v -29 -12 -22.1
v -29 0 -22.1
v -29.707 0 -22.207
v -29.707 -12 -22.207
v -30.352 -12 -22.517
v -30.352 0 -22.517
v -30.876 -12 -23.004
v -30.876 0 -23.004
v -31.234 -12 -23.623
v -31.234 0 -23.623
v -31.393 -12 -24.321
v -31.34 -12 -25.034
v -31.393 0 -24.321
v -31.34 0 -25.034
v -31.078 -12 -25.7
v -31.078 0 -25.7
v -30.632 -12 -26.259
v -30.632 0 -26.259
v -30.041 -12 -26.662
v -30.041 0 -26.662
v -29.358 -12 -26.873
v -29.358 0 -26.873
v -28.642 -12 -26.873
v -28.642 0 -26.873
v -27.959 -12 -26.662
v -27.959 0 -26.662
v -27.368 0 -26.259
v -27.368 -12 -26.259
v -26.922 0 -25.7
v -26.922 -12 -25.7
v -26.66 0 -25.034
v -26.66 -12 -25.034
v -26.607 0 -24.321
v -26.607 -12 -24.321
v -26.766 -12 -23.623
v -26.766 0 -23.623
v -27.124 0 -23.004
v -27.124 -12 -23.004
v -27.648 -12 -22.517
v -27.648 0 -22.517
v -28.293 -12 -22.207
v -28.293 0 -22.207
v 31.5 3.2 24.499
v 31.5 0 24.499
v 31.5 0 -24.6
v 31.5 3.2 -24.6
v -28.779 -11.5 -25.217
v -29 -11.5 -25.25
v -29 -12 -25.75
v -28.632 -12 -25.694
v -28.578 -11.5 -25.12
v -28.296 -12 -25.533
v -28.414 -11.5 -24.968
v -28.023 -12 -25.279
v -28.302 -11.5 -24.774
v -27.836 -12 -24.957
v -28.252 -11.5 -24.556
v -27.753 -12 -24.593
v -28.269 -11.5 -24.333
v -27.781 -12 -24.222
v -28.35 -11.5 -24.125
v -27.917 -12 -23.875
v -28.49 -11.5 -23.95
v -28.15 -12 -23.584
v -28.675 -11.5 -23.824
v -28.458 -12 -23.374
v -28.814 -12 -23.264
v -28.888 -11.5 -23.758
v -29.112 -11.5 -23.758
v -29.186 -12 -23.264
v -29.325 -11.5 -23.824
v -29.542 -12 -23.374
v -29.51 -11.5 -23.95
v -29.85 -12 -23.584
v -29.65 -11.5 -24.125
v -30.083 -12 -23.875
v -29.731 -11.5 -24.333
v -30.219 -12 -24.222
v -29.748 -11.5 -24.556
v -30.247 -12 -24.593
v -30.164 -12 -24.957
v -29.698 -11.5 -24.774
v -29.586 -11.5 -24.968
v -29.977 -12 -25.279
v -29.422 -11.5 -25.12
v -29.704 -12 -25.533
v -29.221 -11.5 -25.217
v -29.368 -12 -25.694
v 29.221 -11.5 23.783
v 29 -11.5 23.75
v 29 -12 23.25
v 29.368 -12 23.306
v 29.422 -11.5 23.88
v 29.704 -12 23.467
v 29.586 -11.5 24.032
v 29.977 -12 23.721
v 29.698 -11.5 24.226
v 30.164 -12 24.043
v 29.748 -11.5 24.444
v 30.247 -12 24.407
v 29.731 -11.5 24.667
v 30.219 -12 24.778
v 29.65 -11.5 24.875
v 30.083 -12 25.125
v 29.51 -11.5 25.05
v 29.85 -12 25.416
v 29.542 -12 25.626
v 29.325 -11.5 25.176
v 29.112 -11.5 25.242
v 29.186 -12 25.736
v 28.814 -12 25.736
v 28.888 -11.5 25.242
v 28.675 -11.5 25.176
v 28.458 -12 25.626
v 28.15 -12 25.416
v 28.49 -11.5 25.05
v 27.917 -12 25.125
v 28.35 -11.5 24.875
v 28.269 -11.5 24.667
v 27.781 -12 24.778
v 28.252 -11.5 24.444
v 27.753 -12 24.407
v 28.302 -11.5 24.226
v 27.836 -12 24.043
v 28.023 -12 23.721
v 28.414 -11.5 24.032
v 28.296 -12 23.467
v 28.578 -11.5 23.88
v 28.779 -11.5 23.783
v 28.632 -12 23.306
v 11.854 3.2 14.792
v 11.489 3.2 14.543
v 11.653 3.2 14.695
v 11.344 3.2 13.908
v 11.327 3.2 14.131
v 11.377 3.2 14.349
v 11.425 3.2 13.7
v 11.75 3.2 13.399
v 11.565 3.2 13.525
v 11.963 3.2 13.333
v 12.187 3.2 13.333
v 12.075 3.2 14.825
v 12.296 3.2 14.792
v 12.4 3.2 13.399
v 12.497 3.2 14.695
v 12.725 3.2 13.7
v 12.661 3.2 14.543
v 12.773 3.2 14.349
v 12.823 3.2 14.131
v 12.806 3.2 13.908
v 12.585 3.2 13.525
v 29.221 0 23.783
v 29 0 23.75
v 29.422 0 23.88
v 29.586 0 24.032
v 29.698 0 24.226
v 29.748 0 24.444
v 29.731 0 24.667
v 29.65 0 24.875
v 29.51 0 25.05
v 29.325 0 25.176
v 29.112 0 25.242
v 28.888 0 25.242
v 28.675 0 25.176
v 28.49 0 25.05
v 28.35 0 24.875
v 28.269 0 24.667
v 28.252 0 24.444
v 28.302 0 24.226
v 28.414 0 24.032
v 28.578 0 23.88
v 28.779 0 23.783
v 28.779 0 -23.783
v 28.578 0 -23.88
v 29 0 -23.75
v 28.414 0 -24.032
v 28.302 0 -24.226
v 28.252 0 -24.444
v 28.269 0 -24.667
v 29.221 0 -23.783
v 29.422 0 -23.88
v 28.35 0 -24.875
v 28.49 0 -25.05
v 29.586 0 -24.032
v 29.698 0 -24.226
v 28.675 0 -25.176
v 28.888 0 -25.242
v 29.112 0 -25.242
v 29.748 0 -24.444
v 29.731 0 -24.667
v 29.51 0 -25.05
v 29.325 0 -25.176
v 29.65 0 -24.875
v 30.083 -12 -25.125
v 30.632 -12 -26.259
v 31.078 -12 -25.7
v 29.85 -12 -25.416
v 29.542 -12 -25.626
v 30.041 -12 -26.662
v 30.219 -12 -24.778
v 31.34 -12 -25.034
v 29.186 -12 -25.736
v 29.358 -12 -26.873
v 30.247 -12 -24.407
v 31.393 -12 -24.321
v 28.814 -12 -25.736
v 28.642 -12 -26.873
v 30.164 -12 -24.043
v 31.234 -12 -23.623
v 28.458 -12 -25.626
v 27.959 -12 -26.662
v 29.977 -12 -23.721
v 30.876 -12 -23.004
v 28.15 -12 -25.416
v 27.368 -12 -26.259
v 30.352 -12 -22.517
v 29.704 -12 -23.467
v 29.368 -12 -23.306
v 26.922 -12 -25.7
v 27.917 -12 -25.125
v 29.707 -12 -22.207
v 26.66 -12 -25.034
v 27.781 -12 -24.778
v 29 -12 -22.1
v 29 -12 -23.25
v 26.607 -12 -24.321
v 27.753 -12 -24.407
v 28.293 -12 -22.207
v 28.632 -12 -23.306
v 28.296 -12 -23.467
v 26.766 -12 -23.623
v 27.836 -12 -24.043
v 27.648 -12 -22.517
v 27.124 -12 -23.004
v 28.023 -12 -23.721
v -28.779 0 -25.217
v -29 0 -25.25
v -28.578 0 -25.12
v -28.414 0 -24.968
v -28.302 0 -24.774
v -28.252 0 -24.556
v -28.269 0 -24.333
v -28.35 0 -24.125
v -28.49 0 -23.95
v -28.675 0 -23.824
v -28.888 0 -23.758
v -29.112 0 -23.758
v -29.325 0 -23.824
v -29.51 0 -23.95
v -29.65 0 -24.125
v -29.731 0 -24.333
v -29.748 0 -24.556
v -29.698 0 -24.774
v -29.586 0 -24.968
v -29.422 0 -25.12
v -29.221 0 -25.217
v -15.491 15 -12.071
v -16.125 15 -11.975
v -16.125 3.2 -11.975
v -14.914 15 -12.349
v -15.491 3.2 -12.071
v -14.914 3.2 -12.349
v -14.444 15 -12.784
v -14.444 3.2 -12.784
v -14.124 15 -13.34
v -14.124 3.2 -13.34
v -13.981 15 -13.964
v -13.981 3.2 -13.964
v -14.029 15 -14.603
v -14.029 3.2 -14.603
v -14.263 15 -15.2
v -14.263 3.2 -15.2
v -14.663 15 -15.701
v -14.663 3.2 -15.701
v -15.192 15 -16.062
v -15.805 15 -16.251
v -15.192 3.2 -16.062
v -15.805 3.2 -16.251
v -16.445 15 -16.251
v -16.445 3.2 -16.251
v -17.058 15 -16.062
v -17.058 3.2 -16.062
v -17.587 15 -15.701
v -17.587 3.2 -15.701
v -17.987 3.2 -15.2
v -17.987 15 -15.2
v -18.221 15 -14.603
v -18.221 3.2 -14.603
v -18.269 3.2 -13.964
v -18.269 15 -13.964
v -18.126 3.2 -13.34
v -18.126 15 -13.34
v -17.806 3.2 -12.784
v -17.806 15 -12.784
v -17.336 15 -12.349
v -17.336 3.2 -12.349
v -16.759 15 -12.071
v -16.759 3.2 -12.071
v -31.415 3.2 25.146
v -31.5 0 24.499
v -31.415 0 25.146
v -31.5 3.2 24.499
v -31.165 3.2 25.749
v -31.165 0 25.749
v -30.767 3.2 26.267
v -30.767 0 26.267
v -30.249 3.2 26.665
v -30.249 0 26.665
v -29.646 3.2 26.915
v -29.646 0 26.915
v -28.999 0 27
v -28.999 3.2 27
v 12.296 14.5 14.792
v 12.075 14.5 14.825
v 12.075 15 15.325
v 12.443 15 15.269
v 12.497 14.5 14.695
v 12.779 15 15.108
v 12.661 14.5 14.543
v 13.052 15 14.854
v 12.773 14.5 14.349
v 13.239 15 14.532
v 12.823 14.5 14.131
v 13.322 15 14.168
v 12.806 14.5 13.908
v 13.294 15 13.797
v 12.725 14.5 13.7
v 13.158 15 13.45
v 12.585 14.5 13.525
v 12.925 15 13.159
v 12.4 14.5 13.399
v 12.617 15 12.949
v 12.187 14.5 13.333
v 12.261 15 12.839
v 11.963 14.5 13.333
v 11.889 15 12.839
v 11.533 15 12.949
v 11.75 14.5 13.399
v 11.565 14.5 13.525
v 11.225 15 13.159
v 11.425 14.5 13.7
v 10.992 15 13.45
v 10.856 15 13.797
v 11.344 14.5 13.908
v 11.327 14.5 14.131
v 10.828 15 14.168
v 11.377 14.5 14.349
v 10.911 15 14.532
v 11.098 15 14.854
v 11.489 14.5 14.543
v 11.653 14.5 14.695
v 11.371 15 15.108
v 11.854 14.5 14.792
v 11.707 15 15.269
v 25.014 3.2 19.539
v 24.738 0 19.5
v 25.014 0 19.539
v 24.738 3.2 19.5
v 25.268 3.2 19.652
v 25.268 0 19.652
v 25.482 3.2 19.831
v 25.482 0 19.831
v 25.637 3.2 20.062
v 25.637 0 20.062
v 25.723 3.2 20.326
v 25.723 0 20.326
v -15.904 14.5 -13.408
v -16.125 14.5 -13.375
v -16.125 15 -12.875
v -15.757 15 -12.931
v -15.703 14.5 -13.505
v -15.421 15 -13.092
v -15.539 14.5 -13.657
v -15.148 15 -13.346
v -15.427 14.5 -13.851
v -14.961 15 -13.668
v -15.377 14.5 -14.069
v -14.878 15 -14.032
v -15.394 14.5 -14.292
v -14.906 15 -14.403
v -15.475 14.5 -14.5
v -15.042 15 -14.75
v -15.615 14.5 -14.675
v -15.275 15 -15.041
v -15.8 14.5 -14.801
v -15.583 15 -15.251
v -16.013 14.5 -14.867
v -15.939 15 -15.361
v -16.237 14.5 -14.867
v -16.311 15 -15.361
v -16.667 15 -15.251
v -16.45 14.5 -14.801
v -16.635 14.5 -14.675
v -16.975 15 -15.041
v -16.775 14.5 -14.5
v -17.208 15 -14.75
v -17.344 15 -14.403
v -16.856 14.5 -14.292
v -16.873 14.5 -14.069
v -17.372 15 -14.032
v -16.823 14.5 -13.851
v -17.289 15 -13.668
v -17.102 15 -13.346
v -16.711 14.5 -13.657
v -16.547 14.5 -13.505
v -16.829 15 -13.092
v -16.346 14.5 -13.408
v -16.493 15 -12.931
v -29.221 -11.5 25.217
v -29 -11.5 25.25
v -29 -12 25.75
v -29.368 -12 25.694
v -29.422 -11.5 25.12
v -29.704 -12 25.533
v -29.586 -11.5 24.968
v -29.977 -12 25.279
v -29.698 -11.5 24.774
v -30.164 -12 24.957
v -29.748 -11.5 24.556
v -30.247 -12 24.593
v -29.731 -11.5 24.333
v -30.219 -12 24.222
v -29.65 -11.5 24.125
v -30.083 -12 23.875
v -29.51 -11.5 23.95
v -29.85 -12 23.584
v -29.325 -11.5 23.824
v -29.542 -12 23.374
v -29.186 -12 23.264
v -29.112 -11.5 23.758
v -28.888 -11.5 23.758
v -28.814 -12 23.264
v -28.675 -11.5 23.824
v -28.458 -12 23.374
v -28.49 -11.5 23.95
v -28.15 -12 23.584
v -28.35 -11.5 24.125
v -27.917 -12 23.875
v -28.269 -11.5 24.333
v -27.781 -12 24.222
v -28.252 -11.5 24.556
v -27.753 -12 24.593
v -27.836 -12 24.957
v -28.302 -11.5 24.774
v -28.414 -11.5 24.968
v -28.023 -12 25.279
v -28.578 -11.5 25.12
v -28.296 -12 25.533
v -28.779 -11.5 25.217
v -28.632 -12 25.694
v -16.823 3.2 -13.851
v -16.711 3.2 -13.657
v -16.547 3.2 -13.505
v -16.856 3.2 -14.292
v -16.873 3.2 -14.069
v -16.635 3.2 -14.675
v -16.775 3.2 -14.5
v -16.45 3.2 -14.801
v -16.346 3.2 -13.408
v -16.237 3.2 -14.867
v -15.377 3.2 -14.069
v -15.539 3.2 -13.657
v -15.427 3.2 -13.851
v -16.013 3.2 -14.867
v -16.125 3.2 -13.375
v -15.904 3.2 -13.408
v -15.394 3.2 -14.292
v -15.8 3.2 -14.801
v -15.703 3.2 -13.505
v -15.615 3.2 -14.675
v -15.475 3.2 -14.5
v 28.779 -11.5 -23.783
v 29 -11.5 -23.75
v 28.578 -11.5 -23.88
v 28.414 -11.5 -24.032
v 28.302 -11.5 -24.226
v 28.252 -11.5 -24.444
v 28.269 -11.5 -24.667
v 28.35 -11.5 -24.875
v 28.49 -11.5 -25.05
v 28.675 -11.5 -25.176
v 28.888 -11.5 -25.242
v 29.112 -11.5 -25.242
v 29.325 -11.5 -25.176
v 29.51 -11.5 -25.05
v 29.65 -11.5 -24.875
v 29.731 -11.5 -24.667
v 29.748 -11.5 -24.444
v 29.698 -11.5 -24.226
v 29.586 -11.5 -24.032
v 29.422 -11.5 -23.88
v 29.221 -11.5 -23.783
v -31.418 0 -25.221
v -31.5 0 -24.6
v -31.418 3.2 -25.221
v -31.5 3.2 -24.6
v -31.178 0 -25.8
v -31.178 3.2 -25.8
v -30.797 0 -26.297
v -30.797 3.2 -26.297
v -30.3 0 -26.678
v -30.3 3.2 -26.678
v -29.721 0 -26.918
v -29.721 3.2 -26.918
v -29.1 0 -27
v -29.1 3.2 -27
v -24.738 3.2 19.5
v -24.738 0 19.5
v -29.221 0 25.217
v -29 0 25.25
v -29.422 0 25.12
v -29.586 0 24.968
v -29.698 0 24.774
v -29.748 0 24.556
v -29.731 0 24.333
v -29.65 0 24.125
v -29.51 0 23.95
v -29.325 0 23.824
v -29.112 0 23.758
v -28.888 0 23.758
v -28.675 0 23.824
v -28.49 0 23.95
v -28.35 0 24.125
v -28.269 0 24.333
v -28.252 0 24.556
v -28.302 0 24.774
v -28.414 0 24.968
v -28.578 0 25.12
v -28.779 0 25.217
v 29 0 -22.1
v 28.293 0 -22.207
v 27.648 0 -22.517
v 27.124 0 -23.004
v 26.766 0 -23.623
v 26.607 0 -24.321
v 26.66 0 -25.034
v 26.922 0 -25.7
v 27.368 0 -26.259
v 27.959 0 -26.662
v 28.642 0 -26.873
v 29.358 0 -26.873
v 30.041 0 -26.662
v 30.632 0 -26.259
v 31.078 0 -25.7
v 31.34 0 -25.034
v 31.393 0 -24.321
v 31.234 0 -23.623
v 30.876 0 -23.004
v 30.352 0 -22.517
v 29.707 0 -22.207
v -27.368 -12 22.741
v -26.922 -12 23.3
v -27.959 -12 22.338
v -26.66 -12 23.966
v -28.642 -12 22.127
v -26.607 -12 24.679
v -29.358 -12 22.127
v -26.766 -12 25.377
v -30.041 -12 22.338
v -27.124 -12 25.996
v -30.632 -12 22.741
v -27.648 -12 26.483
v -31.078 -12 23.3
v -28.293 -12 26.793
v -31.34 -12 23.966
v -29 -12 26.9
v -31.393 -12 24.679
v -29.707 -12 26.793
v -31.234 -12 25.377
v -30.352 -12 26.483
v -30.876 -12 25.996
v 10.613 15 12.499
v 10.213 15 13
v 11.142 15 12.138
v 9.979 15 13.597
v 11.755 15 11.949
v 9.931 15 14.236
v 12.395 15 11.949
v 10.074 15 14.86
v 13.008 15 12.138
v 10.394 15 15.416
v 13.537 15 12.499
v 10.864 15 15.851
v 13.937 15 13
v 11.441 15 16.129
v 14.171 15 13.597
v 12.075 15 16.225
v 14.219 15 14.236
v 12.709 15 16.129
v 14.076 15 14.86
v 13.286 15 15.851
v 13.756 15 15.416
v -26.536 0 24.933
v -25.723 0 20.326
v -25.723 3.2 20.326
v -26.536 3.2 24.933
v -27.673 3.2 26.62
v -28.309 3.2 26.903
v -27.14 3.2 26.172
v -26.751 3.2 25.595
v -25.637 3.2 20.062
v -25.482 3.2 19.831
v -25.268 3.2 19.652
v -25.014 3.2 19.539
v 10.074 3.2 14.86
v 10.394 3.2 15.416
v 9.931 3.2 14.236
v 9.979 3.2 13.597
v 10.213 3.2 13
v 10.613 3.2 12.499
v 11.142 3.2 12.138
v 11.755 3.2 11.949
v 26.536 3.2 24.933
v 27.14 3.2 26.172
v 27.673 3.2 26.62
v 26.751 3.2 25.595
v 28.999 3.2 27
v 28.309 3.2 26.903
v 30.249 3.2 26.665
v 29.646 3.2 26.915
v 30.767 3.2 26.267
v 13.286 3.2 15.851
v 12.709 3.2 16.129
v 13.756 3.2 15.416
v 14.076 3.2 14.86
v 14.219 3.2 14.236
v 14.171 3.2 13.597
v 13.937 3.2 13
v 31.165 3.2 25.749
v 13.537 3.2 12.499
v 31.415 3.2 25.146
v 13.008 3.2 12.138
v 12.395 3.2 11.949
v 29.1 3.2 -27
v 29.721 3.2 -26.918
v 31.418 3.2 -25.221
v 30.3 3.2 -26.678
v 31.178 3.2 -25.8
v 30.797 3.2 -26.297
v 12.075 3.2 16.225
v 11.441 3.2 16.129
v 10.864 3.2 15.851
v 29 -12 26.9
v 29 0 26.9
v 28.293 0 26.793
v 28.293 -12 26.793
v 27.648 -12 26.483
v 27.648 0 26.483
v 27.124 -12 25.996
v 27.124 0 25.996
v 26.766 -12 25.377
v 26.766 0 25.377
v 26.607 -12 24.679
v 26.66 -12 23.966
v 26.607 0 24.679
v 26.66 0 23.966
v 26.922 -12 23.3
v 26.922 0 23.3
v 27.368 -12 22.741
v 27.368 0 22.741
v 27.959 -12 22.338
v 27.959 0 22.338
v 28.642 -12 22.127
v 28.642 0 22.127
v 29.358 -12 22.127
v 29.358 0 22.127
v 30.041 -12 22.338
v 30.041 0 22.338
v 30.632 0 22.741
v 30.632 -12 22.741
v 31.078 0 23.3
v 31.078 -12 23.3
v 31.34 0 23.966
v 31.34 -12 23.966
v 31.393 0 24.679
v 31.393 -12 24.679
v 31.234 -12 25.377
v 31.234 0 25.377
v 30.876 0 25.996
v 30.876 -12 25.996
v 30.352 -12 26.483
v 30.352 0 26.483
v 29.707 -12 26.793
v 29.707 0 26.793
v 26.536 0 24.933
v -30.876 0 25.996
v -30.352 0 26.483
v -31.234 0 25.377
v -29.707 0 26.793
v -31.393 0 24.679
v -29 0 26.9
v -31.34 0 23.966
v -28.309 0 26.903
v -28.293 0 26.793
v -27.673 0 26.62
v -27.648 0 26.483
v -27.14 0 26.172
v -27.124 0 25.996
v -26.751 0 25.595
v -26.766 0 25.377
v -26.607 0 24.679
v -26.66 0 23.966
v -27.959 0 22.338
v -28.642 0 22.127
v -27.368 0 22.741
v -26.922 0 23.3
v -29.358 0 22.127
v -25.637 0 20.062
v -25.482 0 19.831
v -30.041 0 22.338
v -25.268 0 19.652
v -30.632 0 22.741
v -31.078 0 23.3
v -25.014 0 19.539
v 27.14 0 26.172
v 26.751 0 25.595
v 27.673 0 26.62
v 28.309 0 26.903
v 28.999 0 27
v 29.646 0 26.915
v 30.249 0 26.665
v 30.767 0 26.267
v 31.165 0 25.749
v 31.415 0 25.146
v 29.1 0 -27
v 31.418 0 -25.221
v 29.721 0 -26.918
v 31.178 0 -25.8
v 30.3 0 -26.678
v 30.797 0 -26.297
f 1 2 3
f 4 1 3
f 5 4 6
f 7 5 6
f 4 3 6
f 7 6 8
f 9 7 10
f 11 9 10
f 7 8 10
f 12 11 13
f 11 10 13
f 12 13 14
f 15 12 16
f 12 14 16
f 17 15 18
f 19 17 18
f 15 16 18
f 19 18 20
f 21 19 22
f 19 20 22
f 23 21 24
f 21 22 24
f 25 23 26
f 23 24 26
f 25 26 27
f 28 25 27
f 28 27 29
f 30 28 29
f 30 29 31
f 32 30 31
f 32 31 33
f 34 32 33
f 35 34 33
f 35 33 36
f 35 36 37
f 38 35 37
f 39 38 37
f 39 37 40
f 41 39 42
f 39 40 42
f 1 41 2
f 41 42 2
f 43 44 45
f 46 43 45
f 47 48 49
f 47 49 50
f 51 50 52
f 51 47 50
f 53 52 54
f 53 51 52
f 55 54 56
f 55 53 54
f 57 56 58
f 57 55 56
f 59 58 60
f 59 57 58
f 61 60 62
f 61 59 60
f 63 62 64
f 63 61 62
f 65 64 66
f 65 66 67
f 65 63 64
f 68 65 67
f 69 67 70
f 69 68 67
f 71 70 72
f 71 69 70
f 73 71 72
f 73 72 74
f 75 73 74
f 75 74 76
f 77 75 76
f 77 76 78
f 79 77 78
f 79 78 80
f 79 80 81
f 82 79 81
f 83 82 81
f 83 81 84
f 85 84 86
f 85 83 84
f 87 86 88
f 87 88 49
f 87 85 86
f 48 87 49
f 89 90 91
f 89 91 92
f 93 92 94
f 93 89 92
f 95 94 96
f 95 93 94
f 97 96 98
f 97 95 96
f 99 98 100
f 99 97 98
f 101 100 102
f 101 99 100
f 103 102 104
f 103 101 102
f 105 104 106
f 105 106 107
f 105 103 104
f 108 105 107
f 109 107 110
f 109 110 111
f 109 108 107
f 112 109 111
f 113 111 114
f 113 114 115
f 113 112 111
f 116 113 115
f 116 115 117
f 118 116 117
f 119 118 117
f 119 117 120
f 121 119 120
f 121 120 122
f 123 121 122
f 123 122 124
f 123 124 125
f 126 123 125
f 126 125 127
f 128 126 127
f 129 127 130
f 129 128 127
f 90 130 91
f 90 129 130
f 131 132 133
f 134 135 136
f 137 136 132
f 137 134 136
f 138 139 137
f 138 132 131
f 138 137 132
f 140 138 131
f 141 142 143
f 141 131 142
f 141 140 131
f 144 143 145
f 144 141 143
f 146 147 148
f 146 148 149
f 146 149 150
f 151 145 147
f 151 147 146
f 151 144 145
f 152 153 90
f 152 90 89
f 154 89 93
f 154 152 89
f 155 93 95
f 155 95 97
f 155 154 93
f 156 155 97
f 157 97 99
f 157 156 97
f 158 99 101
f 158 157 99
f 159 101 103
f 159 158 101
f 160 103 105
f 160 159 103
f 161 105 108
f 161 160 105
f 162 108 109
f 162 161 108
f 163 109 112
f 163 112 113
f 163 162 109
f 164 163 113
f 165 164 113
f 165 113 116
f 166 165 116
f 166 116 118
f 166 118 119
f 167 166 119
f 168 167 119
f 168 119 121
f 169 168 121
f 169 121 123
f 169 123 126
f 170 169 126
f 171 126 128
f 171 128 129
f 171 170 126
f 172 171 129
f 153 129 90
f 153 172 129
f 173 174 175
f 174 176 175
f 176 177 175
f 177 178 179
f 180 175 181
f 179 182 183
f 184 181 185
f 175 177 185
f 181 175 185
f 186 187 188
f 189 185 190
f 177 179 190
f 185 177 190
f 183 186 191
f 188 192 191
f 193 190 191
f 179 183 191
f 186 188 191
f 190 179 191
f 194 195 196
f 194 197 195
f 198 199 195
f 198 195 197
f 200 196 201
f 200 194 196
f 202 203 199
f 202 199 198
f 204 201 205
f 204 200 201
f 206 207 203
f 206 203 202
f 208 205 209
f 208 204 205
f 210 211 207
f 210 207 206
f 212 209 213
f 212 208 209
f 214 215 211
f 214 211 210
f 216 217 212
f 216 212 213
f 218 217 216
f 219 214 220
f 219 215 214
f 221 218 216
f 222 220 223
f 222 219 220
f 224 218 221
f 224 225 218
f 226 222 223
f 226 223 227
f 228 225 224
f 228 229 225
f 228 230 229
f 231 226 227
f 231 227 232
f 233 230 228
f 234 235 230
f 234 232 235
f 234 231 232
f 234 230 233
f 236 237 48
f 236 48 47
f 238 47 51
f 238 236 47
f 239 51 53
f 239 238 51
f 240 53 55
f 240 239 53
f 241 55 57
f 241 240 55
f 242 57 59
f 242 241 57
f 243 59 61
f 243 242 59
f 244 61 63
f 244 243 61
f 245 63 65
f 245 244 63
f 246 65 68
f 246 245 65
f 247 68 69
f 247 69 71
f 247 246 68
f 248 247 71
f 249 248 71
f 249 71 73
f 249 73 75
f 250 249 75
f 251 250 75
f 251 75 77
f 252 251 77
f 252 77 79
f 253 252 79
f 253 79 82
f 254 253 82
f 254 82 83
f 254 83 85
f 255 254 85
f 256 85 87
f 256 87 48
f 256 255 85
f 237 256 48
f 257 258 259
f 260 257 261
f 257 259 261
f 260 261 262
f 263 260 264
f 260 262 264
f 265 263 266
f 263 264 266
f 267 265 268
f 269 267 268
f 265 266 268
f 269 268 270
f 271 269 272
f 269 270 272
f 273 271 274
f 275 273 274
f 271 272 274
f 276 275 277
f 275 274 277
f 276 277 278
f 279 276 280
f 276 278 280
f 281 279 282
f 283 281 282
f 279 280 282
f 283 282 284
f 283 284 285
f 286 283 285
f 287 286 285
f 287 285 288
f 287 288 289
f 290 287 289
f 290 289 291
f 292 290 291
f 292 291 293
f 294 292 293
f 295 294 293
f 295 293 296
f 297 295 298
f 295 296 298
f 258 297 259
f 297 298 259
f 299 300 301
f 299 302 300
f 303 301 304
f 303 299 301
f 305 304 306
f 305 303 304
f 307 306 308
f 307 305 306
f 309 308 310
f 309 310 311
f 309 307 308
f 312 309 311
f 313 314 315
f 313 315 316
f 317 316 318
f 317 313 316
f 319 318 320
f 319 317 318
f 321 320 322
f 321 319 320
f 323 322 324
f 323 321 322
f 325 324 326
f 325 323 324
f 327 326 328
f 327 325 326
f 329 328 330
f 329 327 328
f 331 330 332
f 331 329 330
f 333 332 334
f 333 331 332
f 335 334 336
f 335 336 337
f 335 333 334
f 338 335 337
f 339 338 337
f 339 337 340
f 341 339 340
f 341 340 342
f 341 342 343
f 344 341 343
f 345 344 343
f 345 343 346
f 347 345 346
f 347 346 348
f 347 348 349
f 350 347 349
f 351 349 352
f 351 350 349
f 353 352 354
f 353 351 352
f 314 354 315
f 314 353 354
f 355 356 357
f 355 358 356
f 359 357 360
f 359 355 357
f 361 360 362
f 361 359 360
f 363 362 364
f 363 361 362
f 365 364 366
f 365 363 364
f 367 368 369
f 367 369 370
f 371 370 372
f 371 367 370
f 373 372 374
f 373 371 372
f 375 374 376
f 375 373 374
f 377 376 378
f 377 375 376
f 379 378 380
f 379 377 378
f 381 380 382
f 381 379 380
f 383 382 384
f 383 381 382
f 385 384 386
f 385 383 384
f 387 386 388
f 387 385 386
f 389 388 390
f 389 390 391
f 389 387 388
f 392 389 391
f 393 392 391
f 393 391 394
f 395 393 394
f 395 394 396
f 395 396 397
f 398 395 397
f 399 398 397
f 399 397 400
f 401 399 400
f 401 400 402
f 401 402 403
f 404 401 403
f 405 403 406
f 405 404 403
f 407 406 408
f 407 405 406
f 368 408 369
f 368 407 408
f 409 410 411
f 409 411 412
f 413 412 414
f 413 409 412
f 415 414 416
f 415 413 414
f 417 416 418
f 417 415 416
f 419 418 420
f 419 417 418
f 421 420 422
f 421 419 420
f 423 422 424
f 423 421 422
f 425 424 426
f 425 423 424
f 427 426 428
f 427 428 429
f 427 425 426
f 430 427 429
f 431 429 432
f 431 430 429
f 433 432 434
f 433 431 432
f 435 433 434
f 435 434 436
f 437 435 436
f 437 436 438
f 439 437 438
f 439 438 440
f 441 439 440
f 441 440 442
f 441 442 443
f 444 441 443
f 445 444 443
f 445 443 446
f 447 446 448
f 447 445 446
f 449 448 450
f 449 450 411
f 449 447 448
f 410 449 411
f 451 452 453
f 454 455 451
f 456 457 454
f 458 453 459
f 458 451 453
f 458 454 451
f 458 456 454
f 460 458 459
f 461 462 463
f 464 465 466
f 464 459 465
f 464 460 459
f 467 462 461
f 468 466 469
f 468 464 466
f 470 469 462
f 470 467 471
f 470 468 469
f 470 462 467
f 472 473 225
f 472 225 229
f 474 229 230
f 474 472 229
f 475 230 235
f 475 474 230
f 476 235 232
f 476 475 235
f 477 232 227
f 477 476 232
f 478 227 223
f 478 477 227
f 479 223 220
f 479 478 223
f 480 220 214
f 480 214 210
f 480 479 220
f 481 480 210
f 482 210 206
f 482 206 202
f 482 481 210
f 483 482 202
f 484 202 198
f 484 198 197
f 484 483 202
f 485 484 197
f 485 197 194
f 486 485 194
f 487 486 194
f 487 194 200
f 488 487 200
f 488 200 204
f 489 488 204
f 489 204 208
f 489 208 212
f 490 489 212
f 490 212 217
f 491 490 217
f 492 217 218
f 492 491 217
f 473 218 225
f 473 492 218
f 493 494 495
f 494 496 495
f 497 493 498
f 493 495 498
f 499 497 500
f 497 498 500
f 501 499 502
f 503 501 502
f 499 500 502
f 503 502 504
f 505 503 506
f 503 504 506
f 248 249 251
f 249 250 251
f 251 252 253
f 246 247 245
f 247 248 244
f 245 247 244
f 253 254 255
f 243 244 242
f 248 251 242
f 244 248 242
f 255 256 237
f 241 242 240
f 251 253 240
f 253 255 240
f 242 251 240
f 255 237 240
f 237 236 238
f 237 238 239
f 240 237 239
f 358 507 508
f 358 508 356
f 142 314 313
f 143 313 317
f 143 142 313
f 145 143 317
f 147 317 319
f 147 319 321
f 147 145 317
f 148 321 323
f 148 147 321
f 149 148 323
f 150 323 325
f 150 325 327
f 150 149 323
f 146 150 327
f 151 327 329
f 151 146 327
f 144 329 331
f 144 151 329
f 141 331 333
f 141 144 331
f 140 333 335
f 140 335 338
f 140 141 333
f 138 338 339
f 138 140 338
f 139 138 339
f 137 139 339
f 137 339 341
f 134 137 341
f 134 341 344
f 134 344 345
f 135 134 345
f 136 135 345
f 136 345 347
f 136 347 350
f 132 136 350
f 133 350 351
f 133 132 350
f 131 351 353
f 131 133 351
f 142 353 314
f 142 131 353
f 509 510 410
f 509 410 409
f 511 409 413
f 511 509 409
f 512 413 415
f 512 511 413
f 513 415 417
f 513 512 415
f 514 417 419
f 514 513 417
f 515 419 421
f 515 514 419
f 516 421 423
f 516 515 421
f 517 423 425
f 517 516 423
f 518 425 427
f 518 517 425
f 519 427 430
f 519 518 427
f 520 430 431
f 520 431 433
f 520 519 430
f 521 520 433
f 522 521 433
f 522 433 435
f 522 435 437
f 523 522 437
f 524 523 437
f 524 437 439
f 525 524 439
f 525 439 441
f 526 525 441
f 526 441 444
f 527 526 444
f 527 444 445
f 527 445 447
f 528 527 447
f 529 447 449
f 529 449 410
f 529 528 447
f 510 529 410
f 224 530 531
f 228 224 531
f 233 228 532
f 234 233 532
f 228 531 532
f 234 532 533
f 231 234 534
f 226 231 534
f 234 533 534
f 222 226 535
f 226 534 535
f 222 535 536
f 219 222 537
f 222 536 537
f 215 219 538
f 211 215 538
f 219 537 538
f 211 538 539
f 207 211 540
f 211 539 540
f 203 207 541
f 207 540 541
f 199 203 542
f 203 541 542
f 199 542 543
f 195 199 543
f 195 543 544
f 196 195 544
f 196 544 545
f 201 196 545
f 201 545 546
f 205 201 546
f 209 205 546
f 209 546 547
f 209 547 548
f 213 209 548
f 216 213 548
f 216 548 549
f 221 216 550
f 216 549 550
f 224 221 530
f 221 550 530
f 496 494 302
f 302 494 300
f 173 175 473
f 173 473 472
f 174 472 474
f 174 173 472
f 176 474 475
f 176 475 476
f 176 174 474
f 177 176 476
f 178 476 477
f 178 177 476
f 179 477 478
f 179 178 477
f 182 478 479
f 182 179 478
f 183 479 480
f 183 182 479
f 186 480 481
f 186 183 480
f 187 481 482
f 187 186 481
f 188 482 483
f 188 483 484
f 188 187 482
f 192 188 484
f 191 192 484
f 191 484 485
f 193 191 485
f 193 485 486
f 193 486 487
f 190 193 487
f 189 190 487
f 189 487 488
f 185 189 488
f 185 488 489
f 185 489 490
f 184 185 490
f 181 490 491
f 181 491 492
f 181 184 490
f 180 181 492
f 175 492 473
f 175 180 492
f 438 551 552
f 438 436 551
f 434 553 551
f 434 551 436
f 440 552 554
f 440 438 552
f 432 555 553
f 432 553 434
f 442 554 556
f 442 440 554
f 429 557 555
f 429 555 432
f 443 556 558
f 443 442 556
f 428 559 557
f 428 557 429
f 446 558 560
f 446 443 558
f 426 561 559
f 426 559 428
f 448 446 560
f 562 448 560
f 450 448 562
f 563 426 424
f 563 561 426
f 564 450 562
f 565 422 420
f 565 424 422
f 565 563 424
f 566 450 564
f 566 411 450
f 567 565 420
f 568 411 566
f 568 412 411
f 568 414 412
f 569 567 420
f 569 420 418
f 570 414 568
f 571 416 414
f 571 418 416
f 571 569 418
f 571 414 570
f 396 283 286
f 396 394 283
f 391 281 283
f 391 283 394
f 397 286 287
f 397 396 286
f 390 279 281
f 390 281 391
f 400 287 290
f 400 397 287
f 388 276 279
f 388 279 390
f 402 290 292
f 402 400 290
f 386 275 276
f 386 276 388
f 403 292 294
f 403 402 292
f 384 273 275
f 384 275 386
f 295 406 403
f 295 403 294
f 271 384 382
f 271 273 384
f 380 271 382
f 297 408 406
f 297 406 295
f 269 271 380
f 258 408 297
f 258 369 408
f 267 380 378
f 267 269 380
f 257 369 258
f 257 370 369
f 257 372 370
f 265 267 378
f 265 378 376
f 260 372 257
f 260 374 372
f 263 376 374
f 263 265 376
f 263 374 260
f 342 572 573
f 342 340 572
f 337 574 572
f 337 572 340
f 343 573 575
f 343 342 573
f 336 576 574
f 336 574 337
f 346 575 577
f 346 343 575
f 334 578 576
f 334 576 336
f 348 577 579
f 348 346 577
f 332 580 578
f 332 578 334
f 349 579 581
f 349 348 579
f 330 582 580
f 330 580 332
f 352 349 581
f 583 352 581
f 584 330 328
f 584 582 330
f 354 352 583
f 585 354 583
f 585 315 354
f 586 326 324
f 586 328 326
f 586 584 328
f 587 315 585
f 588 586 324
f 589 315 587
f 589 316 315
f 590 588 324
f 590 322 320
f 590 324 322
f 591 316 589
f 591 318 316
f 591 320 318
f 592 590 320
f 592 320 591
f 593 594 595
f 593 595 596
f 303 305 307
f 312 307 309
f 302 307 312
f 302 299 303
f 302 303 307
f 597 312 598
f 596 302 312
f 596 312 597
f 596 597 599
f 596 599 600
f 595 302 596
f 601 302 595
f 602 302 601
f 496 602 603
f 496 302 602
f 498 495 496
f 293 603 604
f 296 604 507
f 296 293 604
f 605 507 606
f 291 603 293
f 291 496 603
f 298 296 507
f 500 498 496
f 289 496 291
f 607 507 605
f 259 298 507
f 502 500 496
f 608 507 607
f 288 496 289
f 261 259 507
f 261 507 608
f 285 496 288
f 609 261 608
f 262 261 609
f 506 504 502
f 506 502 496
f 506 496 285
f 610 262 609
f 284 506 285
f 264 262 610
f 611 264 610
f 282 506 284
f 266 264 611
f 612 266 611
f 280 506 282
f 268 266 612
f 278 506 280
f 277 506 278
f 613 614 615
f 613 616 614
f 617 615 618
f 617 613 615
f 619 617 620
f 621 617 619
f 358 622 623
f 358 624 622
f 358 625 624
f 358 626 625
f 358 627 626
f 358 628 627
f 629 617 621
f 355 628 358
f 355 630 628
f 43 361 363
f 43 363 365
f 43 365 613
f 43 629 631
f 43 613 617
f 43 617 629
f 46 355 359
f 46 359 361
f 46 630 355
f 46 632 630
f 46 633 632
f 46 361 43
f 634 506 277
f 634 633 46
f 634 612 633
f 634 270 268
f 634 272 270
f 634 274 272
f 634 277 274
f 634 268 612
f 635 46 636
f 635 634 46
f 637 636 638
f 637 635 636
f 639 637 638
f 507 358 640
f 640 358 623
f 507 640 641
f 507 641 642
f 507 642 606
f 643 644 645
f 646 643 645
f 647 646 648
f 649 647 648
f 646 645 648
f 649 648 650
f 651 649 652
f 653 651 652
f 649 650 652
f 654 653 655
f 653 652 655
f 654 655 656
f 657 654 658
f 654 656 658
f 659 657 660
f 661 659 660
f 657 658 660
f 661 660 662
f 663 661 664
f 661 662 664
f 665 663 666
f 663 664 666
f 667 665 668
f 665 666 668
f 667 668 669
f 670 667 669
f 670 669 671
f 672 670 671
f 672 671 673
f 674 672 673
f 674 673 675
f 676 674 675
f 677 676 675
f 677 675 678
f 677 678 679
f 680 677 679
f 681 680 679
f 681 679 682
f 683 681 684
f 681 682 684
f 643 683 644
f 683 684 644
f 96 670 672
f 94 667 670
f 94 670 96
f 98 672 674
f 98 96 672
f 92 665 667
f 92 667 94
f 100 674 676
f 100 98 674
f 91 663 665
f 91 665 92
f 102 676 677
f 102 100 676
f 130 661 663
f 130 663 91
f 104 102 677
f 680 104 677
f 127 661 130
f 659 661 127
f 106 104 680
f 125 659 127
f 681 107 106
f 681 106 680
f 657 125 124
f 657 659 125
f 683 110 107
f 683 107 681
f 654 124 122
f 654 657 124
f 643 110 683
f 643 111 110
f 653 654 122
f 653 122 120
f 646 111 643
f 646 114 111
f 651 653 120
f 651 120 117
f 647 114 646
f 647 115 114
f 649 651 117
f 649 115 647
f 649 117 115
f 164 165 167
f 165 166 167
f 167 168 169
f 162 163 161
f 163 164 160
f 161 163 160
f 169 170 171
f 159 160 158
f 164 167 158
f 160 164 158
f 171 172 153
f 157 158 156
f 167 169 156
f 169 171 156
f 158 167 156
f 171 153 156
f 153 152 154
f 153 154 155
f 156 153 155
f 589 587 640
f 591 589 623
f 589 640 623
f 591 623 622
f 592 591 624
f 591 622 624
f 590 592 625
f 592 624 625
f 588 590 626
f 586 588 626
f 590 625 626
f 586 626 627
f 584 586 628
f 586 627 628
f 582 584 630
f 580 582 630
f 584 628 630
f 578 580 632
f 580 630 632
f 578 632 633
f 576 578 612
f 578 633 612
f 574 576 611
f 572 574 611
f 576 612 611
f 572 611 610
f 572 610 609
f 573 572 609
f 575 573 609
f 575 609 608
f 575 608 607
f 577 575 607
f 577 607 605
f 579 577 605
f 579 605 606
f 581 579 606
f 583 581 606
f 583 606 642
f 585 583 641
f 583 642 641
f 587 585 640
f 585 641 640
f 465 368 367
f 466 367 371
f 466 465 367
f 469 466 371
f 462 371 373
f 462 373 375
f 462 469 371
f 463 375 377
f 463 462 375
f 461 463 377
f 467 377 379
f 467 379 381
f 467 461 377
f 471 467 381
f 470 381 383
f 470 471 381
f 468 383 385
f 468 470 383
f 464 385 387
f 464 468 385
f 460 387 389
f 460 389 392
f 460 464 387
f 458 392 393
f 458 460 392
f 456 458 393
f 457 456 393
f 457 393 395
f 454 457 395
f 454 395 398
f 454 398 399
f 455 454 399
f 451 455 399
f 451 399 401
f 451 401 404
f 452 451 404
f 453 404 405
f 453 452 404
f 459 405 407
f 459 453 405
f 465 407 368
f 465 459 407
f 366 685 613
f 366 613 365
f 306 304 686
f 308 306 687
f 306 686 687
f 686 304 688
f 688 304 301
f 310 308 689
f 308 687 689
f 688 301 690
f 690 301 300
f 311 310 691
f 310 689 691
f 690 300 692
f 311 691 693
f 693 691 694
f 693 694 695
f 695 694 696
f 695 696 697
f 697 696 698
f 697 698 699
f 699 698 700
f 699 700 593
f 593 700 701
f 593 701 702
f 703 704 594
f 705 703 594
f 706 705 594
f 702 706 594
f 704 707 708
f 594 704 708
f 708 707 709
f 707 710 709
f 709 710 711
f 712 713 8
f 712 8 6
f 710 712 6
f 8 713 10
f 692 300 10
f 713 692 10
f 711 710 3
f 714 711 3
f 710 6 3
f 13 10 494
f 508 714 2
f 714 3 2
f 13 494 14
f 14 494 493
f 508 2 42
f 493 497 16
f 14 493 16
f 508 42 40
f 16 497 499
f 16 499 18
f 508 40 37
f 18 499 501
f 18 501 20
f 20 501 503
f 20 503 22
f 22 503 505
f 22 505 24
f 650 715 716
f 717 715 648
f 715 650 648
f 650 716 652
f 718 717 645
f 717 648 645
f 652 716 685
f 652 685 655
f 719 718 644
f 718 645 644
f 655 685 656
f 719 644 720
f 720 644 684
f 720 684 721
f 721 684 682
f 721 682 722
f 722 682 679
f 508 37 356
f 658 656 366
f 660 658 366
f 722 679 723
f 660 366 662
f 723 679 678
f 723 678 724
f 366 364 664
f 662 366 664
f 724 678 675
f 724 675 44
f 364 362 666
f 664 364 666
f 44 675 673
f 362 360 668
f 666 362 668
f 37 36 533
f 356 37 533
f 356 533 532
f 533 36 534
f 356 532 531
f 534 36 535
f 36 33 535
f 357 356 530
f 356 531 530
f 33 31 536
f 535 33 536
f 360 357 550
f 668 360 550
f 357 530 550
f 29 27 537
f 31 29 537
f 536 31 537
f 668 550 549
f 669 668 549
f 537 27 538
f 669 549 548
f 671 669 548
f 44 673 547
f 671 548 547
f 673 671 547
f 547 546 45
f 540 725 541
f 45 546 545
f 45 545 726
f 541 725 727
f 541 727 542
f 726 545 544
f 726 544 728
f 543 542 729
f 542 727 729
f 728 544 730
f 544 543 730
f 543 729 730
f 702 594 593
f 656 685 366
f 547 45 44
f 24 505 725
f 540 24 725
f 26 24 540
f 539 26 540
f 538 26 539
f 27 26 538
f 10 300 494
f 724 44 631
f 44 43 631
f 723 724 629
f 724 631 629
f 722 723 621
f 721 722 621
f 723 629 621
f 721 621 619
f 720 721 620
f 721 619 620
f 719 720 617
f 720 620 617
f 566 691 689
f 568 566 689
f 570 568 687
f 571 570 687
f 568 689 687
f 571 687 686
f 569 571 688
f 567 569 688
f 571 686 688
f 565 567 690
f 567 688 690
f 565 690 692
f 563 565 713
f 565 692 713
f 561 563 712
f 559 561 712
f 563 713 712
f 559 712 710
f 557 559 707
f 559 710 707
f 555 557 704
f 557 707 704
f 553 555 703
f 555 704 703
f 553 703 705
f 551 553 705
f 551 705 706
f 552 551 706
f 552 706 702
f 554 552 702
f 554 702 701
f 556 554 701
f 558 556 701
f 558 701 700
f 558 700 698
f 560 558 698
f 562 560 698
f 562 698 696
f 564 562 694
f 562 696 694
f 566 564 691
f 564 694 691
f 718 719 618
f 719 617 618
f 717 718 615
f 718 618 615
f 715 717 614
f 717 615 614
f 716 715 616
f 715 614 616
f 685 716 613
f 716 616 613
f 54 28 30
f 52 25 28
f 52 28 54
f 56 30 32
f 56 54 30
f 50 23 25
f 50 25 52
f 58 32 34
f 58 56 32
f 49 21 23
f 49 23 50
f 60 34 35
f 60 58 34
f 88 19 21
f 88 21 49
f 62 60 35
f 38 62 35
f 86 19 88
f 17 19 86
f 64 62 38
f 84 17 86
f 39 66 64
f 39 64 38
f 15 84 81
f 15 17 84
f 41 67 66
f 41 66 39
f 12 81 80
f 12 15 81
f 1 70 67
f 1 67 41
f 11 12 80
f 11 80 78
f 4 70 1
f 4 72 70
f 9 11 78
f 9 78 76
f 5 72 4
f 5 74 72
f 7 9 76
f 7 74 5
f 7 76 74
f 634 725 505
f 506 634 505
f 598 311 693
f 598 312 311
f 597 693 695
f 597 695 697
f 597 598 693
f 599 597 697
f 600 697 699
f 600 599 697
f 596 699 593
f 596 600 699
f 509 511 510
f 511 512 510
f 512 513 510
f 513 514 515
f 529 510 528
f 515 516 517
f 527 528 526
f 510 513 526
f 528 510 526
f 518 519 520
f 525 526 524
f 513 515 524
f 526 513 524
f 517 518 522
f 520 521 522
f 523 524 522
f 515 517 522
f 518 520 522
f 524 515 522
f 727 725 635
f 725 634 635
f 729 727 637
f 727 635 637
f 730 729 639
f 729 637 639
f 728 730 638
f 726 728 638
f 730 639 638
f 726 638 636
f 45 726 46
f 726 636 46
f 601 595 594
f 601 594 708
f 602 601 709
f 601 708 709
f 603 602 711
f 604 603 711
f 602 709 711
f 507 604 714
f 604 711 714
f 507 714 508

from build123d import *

# Parameters (mm, degrees)
BOSS_EXTRUDE1_DEPTH = 3.2
SKETCH2_R           = 2.4
SKETCH2_R_2         = 0.75
BOSS_EXTRUDE2_DEPTH = 12
SKETCH3_R           = 2.15
SKETCH3_R_2         = 0.75
BOSS_EXTRUDE3_DEPTH = 11.8
CHAMFER1_SIZE       = 0.5
CHAMFER2_SIZE       = 1.9
CHAMFER2_SIZE_2     = 10.775435457
FILLET1_R           = 2.4
FILLET2_R           = 2.501224
FILLET3_R           = 2.501224
FILLET4_R           = 1


# Some blends are built 0.0001 mm under size
with BuildPart() as part:
    # Sketch1 → Boss-Extrude1 (new body)
    with BuildSketch(Plane(origin=(0, 0, 0), x_dir=(1, 0, 0), z_dir=(0, 1, 0))):
        Polygon((31.5, 27), (-31.5, 27), (-31.5, -27), (-25, -27), (-25, -19.5), (25, -19.5), (25, -27), (31.5, -27), align=None)
    extrude(amount=BOSS_EXTRUDE1_DEPTH)

    # Sketch2 → Boss-Extrude2 (add)
    # profile 1 of 4: a face of its own
    with BuildSketch(Plane.XZ):
        with Locations(Location((-29, -24.5, 0), (0, 0, 90))):
            Circle(SKETCH2_R)
        with Locations(Location((-29, -24.5, 0), (0, 0, 270))):
            Circle(SKETCH2_R_2, mode=Mode.SUBTRACT)
    # profile 2 of 4: a face of its own
    with BuildSketch(Plane.XZ):
        with Locations(Location((29, -24.5, 0), (0, 0, 90))):
            Circle(SKETCH2_R)
        with Locations(Location((29, -24.5, 0), (0, 0, 90))):
            Circle(SKETCH2_R_2, mode=Mode.SUBTRACT)
    # profile 3 of 4: a face of its own
    with BuildSketch(Plane.XZ):
        with Locations(Location((29, 24.5, 0), (0, 0, 90))):
            Circle(SKETCH2_R)
        with Locations(Location((29, 24.5, 0), (0, 0, 270))):
            Circle(SKETCH2_R_2, mode=Mode.SUBTRACT)
    # profile 4 of 4: a face of its own
    with BuildSketch(Plane.XZ):
        with Locations(Location((-29, 24.5, 0), (0, 0, 90))):
            Circle(SKETCH2_R)
        with Locations(Location((-29, 24.5, 0), (0, 0, 90))):
            Circle(SKETCH2_R_2, mode=Mode.SUBTRACT)
    extrude(amount=BOSS_EXTRUDE2_DEPTH)

    # Sketch3 → Boss-Extrude3 (add)
    # profile 1 of 2: a face of its own
    with BuildSketch(Plane(origin=(0, 3.2, 0), x_dir=(1, 0, 0), z_dir=(0, 1, 0))):
        with Locations(Location((-16.125, 14.125, 0), (0, 0, 270))):
            Circle(SKETCH3_R)
        with Locations(Location((-16.125, 14.125, 0), (0, 0, 270))):
            Circle(SKETCH3_R_2, mode=Mode.SUBTRACT)
    # profile 2 of 2: a face of its own
    with BuildSketch(Plane(origin=(0, 3.2, 0), x_dir=(1, 0, 0), z_dir=(0, 1, 0))):
        with Locations(Location((12.075, -14.075, 0), (0, 0, 270))):
            Circle(SKETCH3_R)
        with Locations(Location((12.075, -14.075, 0), (0, 0, 270))):
            Circle(SKETCH3_R_2, mode=Mode.SUBTRACT)
    extrude(amount=BOSS_EXTRUDE3_DEPTH)

    # Chamfer1
    chamfer1_edges = [part.edges().sort_by_distance(p)[0] for p in [
        (-29, -12, -23.75),
        (29, -12, -25.25),
        (29, -12, 25.25),
        (-29, -12, 23.75),
        (-16.125, 15, -14.875),
        (12.075, 15, 13.325),
    ]]
    chamfer(chamfer1_edges, length=CHAMFER1_SIZE)

    # Chamfer2
    # the kernel refuses this chamfer: 10.775435457, 1.9 mm, written as the material it takes off along each edge
    with BuildSketch(Plane(origin=(25, -28.000387084, 27), x_dir=(0.9776715712462577, 0, 0.2101387607674357), z_dir=(0, 1, 0))) as chamfer2_piece_1_section:
        Polygon((CHAMFER2_SIZE * 0.977671571246, CHAMFER2_SIZE * 0.210138760767), (-CHAMFER2_SIZE_2 * 0.210138760773, CHAMFER2_SIZE_2 * 0.977671571271), (0, 0), align=None)
    chamfer2_piece_1 = extrude(amount=59.200774168, mode=Mode.PRIVATE)
    chamfer2_piece_1 = split(chamfer2_piece_1, bisect_by=Plane(origin=(25.592384699, 1.6, 19.5), z_dir=(0, 0, 1)), keep=Keep.TOP, mode=Mode.PRIVATE)
    add(chamfer2_piece_1, mode=Mode.SUBTRACT)
    with BuildSketch(Plane(origin=(-25, -28.000387084, 27), x_dir=(0.006682531656101439, 0, -0.9999776716360547), z_dir=(0, 1, 0))) as chamfer2_piece_2_section:
        Polygon((CHAMFER2_SIZE_2 * 0.999977671661, CHAMFER2_SIZE_2 * 0.00668253165627), (-CHAMFER2_SIZE * 0.0066825316561, CHAMFER2_SIZE * 0.999977671636), (0, 0), align=None)
    chamfer2_piece_2 = extrude(amount=59.200774168, mode=Mode.PRIVATE)
    chamfer2_piece_2 = split(chamfer2_piece_2, bisect_by=Plane(origin=(-25.592384699, 1.6, 19.5), z_dir=(0, 0, 1)), keep=Keep.TOP, mode=Mode.PRIVATE)
    add(chamfer2_piece_2, mode=Mode.SUBTRACT)

    # Fillet1
    fillet1_edges = [part.edges().sort_by_distance(p)[0] for p in [
        (-31.5, 1.6, -27),
        (31.5, 1.6, -27),
    ]]
    fillet(fillet1_edges, radius=FILLET1_R)

    # Fillet2
    fillet2_edges = [part.edges().sort_by_distance(p)[0] for p in [
        (31.5, 1.6, 27),
        (26.9, 1.6, 27),
    ]]
    fillet(fillet2_edges, radius=FILLET2_R - 0.0001)  # a hair under: the kernel refuses the full size

    # Fillet3
    fillet3_edges = [part.edges().sort_by_distance(p)[0] for p in [
        (-31.5, 1.6, 27),
        (-26.9, 1.6, 27),
    ]]
    fillet(fillet3_edges, radius=FILLET3_R - 0.0001)  # a hair under: the kernel refuses the full size

    # Fillet4
    fillet4_edges = [part.edges().sort_by_distance(p)[0] for p in [
        (25.577547645, 1.6, 19.5),
        (-25.577547645, 1.6, 19.5),
    ]]
    fillet(fillet4_edges, radius=FILLET4_R)


solid = part.part
